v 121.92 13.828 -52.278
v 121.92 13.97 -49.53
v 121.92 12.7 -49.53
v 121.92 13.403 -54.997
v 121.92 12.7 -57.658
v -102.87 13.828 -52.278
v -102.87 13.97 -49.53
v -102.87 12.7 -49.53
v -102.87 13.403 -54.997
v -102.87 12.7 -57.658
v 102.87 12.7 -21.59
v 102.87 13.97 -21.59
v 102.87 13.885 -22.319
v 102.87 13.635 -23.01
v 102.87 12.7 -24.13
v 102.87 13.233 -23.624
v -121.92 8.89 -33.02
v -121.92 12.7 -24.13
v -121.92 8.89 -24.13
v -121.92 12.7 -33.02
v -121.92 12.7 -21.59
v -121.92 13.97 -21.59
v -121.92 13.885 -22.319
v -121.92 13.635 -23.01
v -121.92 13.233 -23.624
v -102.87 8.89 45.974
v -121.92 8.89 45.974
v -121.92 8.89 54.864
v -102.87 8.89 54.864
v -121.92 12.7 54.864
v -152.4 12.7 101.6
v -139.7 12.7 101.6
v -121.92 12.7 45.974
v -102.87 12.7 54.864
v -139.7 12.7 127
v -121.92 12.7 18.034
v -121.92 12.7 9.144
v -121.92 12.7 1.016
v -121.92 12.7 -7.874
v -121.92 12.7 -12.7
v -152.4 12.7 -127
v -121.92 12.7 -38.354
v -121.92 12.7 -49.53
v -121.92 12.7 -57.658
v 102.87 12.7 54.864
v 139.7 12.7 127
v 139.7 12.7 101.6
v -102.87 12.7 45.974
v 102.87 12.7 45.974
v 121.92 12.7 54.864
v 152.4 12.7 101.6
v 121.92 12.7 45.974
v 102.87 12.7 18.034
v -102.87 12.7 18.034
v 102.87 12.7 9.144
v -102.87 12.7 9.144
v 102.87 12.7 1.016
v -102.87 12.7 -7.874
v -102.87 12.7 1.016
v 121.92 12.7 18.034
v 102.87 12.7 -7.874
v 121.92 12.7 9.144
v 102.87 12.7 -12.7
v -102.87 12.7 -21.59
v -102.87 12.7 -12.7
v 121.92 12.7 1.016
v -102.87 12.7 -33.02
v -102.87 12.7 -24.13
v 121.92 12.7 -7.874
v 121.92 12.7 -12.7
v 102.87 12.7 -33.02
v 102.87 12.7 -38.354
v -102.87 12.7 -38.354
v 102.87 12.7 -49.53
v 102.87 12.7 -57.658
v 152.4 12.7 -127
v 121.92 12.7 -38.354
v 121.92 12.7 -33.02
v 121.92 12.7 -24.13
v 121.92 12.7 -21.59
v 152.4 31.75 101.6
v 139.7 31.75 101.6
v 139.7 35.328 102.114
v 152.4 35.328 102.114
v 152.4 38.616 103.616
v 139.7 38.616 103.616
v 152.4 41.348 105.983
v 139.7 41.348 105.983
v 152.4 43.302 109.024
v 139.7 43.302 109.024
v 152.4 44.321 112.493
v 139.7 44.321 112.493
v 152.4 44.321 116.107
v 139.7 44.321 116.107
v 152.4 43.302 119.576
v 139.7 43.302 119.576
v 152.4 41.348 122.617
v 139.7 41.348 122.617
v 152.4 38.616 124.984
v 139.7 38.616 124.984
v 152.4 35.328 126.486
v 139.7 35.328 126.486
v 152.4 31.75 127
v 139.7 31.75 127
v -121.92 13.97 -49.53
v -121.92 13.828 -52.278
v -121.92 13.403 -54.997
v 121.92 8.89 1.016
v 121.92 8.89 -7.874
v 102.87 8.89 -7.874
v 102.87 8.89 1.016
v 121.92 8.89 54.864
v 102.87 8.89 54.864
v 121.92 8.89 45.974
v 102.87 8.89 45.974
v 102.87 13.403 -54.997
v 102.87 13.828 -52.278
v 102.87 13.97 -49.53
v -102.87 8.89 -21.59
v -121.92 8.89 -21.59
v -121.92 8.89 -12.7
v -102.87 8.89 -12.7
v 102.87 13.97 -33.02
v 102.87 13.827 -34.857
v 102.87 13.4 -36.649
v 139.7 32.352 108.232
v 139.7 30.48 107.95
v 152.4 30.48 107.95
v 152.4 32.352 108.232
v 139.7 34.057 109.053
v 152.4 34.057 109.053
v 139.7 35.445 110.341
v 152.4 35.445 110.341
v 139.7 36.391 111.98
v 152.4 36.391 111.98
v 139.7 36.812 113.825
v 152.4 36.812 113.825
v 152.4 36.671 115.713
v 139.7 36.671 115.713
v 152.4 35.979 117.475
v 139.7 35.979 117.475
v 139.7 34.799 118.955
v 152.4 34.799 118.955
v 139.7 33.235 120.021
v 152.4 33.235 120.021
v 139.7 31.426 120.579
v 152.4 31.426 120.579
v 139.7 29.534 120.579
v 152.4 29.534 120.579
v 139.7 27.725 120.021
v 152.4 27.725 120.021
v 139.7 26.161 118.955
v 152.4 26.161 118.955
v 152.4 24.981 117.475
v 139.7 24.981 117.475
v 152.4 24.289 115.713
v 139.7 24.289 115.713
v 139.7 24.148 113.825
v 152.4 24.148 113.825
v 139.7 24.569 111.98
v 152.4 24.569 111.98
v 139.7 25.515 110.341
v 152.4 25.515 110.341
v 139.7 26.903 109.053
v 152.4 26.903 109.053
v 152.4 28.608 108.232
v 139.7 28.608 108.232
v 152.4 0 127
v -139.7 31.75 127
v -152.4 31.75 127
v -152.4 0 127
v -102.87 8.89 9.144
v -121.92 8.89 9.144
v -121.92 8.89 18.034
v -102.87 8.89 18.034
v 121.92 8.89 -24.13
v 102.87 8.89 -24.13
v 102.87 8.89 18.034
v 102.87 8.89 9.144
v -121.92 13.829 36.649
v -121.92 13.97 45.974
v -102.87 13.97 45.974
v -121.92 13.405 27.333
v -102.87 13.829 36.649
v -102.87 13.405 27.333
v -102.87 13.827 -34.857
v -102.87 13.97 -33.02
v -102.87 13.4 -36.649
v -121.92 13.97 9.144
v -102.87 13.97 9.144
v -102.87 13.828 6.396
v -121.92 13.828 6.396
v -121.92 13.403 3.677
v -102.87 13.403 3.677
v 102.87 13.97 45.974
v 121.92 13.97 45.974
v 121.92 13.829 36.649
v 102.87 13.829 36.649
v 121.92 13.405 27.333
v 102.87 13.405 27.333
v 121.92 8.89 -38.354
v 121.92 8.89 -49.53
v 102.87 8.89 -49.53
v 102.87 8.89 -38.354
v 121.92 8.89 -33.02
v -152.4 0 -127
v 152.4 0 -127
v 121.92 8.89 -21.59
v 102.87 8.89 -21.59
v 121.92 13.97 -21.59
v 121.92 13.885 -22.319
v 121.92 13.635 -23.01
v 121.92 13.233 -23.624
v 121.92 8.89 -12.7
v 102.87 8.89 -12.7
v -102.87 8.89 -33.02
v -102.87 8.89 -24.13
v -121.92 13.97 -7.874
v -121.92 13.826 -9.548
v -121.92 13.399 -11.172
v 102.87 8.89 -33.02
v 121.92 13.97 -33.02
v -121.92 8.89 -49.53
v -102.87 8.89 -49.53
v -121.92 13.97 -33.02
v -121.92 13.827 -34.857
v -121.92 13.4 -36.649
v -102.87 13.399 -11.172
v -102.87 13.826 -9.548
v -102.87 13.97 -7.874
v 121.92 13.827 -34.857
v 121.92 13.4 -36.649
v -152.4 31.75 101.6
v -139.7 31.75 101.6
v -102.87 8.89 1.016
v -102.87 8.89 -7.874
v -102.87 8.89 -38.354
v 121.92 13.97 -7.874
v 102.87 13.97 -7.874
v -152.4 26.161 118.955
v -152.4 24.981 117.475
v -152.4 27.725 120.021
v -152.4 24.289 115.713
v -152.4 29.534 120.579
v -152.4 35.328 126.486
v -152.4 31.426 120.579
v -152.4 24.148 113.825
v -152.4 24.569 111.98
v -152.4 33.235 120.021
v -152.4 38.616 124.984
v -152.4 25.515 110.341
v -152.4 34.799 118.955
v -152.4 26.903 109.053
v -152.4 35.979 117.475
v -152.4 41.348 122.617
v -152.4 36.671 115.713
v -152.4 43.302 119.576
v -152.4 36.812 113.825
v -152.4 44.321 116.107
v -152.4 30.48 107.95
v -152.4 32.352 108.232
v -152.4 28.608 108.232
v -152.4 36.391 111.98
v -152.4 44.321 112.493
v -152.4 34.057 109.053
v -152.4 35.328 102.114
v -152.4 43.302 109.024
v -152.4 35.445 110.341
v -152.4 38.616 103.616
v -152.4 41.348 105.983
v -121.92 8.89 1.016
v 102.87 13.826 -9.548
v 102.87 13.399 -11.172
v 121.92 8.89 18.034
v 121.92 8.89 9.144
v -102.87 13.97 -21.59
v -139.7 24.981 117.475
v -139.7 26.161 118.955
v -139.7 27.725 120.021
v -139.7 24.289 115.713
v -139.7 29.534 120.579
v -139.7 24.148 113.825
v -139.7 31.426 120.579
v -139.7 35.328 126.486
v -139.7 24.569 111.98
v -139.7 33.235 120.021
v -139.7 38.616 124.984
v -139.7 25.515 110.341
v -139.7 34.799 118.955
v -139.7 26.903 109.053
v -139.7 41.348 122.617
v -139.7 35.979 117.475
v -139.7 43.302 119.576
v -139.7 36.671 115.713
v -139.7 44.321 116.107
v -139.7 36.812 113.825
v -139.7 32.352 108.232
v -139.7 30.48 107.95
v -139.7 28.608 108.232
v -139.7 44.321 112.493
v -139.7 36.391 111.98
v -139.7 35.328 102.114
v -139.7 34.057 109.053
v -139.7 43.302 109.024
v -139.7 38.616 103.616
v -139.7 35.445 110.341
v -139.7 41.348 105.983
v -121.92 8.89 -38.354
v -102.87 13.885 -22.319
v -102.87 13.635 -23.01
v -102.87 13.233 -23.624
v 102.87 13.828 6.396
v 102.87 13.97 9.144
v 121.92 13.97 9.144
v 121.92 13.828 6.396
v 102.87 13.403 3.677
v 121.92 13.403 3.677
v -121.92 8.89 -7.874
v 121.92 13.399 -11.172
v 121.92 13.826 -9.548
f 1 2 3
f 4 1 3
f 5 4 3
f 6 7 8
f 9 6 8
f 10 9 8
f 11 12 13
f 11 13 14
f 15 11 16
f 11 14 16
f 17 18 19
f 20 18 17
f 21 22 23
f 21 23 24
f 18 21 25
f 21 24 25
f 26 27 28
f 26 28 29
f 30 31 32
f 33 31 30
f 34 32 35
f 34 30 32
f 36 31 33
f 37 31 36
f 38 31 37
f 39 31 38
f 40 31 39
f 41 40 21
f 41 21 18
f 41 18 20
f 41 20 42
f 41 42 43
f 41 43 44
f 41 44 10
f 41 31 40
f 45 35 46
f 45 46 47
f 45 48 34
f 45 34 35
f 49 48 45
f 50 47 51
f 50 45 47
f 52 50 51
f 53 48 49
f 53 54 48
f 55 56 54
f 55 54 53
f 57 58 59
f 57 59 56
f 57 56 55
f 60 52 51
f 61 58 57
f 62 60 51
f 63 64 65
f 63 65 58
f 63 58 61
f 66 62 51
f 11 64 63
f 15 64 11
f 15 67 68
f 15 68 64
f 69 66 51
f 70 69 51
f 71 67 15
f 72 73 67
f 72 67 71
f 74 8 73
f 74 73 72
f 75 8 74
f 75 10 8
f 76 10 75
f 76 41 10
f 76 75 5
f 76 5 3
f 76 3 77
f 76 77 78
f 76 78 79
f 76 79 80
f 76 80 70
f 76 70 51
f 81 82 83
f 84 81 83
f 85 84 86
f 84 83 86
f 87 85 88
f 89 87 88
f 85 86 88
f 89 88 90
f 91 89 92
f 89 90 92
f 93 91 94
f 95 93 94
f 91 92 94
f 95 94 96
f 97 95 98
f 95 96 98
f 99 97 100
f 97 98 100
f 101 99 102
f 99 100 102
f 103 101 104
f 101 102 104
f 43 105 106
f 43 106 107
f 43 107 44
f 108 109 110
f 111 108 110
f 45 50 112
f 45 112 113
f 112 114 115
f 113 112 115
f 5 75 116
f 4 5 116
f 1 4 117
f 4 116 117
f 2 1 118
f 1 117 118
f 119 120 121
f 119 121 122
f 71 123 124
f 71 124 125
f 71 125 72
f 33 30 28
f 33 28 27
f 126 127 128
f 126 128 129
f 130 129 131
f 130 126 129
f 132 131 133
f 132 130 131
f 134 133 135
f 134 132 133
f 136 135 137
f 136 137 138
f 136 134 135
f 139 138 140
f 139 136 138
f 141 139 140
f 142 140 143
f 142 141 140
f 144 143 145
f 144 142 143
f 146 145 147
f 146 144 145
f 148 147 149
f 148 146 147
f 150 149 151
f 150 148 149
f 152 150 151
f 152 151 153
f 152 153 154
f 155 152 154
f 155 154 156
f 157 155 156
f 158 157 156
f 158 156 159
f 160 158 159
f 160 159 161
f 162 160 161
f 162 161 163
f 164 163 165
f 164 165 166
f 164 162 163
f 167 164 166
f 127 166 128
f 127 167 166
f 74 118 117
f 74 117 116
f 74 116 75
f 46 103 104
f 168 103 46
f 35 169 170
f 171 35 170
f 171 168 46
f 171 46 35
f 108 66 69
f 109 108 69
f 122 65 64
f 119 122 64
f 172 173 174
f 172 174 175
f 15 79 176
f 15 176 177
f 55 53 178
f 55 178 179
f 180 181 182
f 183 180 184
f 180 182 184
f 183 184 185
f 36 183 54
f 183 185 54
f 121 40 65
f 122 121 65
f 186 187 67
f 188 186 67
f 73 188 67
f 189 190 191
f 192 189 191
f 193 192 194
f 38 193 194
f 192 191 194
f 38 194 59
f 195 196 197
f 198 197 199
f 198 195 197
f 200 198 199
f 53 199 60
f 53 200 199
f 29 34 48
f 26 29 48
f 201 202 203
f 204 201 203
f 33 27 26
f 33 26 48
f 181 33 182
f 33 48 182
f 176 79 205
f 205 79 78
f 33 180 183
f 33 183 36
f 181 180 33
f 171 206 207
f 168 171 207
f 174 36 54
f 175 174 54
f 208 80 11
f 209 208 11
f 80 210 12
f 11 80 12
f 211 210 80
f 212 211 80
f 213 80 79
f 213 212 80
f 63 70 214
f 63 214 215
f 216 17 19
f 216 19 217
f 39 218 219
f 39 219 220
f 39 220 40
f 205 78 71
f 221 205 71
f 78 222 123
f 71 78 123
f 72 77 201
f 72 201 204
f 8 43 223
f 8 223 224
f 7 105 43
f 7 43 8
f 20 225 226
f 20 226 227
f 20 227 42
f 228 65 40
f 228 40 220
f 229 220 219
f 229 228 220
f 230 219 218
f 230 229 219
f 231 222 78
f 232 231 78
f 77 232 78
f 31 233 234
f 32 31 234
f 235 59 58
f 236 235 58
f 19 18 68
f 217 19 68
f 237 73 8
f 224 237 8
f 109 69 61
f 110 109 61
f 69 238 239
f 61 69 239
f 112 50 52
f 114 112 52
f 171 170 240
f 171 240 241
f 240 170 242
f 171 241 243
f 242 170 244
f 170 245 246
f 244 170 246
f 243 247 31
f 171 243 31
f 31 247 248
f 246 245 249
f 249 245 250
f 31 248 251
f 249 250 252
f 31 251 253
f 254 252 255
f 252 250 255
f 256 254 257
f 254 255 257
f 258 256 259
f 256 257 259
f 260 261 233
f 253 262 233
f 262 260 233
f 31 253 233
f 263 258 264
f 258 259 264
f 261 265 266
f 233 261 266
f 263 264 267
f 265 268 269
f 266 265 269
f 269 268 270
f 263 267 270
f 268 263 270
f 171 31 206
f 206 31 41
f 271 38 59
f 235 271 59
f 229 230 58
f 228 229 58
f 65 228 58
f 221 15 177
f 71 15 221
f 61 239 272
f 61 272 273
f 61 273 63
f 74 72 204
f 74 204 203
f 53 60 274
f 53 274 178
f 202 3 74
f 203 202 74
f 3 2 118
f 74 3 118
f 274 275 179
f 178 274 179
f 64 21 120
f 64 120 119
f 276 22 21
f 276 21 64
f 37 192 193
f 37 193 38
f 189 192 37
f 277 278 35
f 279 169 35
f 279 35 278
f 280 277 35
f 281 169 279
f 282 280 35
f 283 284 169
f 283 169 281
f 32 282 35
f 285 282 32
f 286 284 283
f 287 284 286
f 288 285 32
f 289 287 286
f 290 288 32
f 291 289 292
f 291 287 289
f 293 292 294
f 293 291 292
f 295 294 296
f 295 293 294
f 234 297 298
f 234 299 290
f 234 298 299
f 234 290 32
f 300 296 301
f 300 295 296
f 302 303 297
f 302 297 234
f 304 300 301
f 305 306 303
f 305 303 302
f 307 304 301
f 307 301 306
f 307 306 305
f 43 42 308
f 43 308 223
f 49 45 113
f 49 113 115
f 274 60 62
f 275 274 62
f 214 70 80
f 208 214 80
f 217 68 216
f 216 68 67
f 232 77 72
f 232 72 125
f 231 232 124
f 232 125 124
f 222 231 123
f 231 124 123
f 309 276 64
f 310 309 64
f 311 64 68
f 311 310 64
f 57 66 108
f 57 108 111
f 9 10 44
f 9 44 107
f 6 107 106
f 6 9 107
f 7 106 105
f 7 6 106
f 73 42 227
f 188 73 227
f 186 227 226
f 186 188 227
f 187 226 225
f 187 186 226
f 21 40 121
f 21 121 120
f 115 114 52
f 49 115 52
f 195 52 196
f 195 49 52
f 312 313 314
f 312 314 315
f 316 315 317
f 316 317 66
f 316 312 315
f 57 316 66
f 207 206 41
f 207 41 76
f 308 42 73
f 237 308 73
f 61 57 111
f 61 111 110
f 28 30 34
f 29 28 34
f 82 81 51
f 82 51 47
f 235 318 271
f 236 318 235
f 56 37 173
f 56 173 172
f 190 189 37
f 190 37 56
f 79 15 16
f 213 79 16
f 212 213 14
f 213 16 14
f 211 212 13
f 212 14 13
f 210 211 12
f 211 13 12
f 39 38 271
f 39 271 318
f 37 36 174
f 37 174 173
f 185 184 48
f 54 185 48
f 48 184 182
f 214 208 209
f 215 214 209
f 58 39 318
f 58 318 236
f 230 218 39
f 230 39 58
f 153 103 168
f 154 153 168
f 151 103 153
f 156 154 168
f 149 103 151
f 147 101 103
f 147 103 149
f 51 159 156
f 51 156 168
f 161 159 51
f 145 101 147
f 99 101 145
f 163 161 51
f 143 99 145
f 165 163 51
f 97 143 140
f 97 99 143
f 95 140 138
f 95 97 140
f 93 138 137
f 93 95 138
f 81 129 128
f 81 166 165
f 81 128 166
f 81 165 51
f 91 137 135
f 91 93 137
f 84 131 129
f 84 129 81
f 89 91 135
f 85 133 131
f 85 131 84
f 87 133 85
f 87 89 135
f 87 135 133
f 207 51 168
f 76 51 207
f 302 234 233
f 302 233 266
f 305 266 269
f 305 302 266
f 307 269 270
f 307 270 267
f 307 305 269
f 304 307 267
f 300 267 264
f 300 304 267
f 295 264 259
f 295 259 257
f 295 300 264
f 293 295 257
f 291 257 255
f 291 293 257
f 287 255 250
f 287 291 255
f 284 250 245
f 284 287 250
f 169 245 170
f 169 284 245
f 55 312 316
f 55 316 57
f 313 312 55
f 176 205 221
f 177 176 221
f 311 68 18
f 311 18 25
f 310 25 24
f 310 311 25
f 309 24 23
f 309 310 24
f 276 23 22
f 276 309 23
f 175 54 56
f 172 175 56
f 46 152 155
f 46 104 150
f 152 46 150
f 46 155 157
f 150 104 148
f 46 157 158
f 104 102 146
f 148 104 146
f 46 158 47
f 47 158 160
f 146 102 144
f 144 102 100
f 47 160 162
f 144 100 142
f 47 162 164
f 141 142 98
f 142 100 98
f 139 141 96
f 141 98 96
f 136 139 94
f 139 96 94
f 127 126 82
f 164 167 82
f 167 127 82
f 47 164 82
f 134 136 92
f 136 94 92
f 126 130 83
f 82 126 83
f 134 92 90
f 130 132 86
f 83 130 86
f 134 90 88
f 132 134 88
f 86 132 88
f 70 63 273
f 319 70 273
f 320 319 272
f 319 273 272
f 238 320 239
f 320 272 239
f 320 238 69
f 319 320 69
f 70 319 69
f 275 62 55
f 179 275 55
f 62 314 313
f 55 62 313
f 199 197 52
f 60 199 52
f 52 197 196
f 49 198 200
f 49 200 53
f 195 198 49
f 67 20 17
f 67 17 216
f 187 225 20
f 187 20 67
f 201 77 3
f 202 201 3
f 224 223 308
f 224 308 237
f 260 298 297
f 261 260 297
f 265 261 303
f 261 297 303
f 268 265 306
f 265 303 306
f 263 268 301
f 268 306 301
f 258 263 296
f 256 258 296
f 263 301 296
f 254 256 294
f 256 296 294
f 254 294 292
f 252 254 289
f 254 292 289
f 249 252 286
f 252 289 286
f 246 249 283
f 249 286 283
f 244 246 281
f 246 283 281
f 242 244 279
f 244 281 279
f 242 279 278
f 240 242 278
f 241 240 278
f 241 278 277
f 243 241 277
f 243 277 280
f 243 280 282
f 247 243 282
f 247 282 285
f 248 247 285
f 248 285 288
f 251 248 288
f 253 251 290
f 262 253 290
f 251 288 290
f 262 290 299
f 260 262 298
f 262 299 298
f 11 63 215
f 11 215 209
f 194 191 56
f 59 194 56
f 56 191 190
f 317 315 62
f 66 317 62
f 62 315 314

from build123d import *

# Parameters (mm, degrees)
SKETCH1_W           = 304.8
SKETCH1_H           = 254
BOSS_EXTRUDE1_DEPTH = 12.7
SKETCH2_W           = 12.7
SKETCH2_H           = 25.4
BOSS_EXTRUDE2_DEPTH = 19.05
BOSS_EXTRUDE3_DEPTH = 12.7
SKETCH5_R           = 6.35
CUT_EXTRUDE1_DEPTH  = 12.7
SKETCH6_W           = 19.05
SKETCH6_H           = 8.89
SKETCH6_H_2         = 11.176
CUT_EXTRUDE2_DEPTH  = 3.81
BOSS_EXTRUDE4_DEPTH = 19.05


with BuildPart() as part:
    # Sketch1 → Boss-Extrude1 (new body)
    with BuildSketch(Plane(origin=(0, 0, 0), x_dir=(1, 0, 0), z_dir=(0, 1, 0))):
        Rectangle(SKETCH1_W, SKETCH1_H)
    extrude(amount=BOSS_EXTRUDE1_DEPTH)

    # Sketch2 → Boss-Extrude2 (add)
    with BuildSketch(Plane(origin=(0, 12.7, 0), x_dir=(1, 0, 0), z_dir=(0, 1, 0))):
        with Locations((-146.05, -114.3)):
            Rectangle(SKETCH2_W, SKETCH2_H)
    boss_extrude2 = extrude(amount=BOSS_EXTRUDE2_DEPTH)

    # Sketch4 → Boss-Extrude3 (add)
    with BuildSketch(Plane(origin=(-139.7, 0, 0), x_dir=(0, 0, -1), z_dir=(1, 0, 0))):
        with BuildLine():
            Line((-127, 31.75), (-101.6, 31.75))
            ThreePointArc((-101.6, 31.75), (-114.3, 44.45), (-127, 31.75))
        make_face()
    boss_extrude3 = extrude(amount=-BOSS_EXTRUDE3_DEPTH)

    # Sketch5 → Cut-Extrude1 (cut)
    with BuildSketch(Plane(origin=(-139.7, 0, 0), x_dir=(0, 0, -1), z_dir=(1, 0, 0))):
        with Locations((-114.3, 30.48)):
            Circle(SKETCH5_R)
    cut_extrude1 = extrude(amount=-CUT_EXTRUDE1_DEPTH, mode=Mode.SUBTRACT)

    # Mirror1: Boss-Extrude2, Boss-Extrude3, Cut-Extrude1 across plane
    add(boss_extrude2.mirror(Plane(origin=(0, 0, 0), x_dir=(0, 0, 1), z_dir=(1, 0, 0))))
    add(boss_extrude3.mirror(Plane(origin=(0, 0, 0), x_dir=(0, 0, 1), z_dir=(1, 0, 0))))
    add(cut_extrude1.mirror(Plane(origin=(0, 0, 0), x_dir=(0, 0, 1), z_dir=(1, 0, 0))), mode=Mode.SUBTRACT)

    # Sketch6 → Cut-Extrude2 (cut)
    with BuildSketch(Plane(origin=(0, 12.7, 0), x_dir=(1, 0, 0), z_dir=(0, 1, 0))):
        with Locations((-112.395, -50.419)):
            Rectangle(SKETCH6_W, SKETCH6_H)
        with Locations((-112.395, -13.589)):
            Rectangle(SKETCH6_W, SKETCH6_H)
        with Locations((-112.395, 17.145)):
            Rectangle(SKETCH6_W, SKETCH6_H)
        with Locations((-112.395, 3.429)):
            Rectangle(SKETCH6_W, SKETCH6_H)
        with Locations((-112.395, 28.575)):
            Rectangle(SKETCH6_W, SKETCH6_H)
        with Locations((-112.395, 43.942)):
            Rectangle(SKETCH6_W, SKETCH6_H_2)
    cut_extrude2 = extrude(amount=-CUT_EXTRUDE2_DEPTH, mode=Mode.SUBTRACT)

    # Sketch7 → Boss-Extrude4 (add)
    with BuildSketch(Plane.ZY.offset(102.87)):
        with BuildLine():
            Line((45.974, 12.7), (45.974, 13.97))
            ThreePointArc((45.974, 13.97), (31.989575629, 13.652336171), (18.034, 12.7))
            Line((18.034, 12.7), (45.974, 12.7))
        make_face()
        with BuildLine():
            Line((9.144, 12.7), (9.144, 13.97))
            ThreePointArc((9.144, 13.97), (5.030689776, 13.650585434), (1.016, 12.7))
            Line((1.016, 12.7), (9.144, 12.7))
        make_face()
        with BuildLine():
            Line((-7.874, 12.7), (-12.7, 12.7))
            ThreePointArc((-12.7, 12.7), (-10.369154103, 13.647185593), (-7.874, 13.97))
            Line((-7.874, 13.97), (-7.874, 12.7))
        make_face()
        with BuildLine():
            Line((-21.59, 12.7), (-24.13, 12.7))
            ThreePointArc((-24.13, 12.7), (-23.009903166, 13.634806331), (-21.59, 13.97))
            Line((-21.59, 13.97), (-21.59, 12.7))
        make_face()
        with BuildLine():
            Line((-33.02, 12.7), (-38.354, 12.7))
            ThreePointArc((-38.354, 12.7), (-35.761553209, 13.64812348), (-33.02, 13.97))
            Line((-33.02, 13.97), (-33.02, 12.7))
        make_face()
        with BuildLine():
            Line((-49.53, 12.7), (-57.658, 12.7))
            ThreePointArc((-57.658, 12.7), (-53.643310224, 13.650585434), (-49.53, 13.97))
            Line((-49.53, 13.97), (-49.53, 12.7))
        make_face()
    boss_extrude4 = extrude(amount=BOSS_EXTRUDE4_DEPTH)

    # Mirror2: Cut-Extrude2, Boss-Extrude4 across plane
    add(cut_extrude2.mirror(Plane(origin=(0, 0, 0), x_dir=(0, 0, 1), z_dir=(1, 0, 0))), mode=Mode.SUBTRACT)
    add(boss_extrude4.mirror(Plane(origin=(0, 0, 0), x_dir=(0, 0, 1), z_dir=(1, 0, 0))))


solid = part.part
